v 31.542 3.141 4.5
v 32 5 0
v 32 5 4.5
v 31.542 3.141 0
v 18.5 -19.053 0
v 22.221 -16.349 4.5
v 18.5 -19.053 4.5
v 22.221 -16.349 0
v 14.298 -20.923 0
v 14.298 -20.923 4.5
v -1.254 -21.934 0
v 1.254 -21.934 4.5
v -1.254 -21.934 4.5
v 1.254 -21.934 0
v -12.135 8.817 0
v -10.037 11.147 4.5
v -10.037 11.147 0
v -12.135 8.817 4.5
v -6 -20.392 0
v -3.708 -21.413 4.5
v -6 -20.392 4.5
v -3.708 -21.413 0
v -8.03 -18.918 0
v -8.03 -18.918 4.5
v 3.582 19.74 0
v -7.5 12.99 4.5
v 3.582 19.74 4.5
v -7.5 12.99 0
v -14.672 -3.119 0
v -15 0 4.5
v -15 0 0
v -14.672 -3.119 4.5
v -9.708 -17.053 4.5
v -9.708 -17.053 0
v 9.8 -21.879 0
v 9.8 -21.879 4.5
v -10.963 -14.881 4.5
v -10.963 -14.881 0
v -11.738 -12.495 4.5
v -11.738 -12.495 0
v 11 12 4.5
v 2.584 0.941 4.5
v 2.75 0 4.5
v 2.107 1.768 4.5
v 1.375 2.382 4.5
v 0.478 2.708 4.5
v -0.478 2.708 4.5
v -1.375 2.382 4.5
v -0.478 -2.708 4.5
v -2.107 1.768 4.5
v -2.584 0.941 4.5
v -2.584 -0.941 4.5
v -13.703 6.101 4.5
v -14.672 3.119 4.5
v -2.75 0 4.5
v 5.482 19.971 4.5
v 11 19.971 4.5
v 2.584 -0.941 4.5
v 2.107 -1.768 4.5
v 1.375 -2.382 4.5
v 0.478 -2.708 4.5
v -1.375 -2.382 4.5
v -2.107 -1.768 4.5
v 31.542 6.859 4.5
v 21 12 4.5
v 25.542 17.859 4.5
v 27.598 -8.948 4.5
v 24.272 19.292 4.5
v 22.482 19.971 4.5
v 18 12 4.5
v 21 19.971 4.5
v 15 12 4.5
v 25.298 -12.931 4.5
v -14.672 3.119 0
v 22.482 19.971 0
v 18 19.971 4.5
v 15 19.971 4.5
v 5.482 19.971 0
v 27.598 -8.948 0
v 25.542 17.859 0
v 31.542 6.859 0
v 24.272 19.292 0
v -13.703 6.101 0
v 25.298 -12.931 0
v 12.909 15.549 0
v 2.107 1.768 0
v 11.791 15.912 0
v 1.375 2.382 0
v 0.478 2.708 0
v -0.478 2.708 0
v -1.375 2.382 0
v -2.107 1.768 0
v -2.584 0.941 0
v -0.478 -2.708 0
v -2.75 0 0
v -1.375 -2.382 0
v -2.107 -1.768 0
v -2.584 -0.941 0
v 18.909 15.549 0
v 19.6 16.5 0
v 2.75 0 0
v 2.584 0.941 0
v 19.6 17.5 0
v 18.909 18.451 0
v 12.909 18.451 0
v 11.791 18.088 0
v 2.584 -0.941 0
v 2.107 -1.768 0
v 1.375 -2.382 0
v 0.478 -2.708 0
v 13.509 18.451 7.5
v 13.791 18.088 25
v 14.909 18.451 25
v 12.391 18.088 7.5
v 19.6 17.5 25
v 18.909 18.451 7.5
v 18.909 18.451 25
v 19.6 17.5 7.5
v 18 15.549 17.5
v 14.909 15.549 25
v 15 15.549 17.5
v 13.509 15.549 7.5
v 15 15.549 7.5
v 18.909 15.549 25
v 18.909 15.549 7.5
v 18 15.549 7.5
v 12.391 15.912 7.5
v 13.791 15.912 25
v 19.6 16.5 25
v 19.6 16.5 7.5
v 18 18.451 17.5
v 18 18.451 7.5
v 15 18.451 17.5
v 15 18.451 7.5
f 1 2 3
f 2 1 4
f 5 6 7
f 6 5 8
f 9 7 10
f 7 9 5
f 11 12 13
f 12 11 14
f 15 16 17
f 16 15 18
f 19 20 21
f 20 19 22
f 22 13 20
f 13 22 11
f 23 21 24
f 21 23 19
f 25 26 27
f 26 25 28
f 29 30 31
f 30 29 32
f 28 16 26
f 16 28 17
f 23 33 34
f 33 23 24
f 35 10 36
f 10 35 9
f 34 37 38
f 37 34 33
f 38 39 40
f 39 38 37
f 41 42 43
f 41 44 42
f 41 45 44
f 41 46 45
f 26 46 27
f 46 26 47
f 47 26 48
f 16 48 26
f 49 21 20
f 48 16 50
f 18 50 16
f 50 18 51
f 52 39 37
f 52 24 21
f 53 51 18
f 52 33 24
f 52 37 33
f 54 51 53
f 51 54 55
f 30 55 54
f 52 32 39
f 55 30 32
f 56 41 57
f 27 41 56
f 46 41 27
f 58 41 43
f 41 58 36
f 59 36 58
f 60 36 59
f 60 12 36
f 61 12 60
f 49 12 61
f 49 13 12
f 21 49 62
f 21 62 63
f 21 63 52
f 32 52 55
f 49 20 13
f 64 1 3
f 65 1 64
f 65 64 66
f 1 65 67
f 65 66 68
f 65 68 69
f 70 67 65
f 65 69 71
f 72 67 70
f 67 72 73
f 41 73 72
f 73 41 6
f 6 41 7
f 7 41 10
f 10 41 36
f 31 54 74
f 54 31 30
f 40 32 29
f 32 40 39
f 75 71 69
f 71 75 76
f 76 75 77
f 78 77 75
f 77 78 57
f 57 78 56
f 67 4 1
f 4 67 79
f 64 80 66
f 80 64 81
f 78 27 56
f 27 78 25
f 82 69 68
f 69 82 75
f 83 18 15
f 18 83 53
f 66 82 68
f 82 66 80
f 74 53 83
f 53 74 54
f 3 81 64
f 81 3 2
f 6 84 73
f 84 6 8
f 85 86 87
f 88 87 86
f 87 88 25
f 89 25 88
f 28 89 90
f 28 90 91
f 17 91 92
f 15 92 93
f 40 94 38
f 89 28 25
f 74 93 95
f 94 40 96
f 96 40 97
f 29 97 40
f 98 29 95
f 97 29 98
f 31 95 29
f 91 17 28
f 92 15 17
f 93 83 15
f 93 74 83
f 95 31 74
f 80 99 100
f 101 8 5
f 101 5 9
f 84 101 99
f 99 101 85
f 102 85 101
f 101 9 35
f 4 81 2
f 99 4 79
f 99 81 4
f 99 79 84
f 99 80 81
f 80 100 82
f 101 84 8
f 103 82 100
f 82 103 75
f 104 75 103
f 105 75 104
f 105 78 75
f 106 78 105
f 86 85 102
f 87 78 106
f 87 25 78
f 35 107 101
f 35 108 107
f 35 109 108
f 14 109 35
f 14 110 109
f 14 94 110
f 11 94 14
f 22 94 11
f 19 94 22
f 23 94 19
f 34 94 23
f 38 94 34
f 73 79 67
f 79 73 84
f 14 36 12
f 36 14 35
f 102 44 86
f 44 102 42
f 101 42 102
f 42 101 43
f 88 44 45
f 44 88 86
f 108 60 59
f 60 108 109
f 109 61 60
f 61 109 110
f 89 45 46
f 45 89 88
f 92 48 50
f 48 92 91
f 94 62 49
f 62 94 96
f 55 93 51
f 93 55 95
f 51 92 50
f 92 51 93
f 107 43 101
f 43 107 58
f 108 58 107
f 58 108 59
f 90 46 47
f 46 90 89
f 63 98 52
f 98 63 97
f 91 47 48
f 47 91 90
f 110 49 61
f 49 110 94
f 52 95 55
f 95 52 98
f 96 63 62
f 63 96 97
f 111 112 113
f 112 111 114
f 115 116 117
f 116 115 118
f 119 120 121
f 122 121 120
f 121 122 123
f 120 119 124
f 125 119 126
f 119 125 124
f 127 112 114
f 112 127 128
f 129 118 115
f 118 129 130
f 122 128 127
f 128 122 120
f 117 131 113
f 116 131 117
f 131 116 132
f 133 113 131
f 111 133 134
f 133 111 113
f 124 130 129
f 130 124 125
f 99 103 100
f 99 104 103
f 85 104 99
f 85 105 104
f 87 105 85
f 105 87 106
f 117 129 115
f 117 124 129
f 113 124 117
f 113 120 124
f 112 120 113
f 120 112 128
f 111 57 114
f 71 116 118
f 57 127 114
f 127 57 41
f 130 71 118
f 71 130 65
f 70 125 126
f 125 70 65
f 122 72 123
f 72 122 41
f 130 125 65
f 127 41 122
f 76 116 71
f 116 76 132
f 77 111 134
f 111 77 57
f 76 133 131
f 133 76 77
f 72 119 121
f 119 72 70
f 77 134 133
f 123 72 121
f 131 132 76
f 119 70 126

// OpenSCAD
//---------------------------------------------------------------------------------------------------
// This work by Jordan Andersen licensed under the Creative Commons Attribution 3.0 Unported License.
// To view a copy of this license, visit http://creativecommons.org/licenses/by/3.0/
//---------------------------------------------------------------------------------------------------
//
// Replacement Lower Guide Plate for the Truvativ X-Guide Chain Guide
//
//---------------------------------------------------------------------------------------------------
SHIELD_HEIGHT = 4.5;
HOLE_RADIUS = 2.75;
POST_HEIGHT = 25;

POST_WIDTH_TOP = 4;
POST_WIDTH_BOTTOM = 6;
POST_POSITION = [12.6, 17.5, 0];
POST_ROUNDING_RADIUS = 1;


//---------------------------------------------------------------------------------

//The shield portion of the part. Form is not super strongly connected to function.
module shield()
{
    hull()
    {
         cylinder(r=15, h=SHIELD_HEIGHT, center=false);
    
        translate([7.5, 0, 0]) difference()
        {
            
            cylinder(r=22, h=SHIELD_HEIGHT, center=false);  
            union()
            {     
                translate([0, 0, -2]) cube([100,25,9]);
                translate([-25, -50, -2]) cube([25,100,9]);
            }
        }

        translate([0, -10, 0])  cylinder(r=12, h=SHIELD_HEIGHT, center=false);

        translate([28, 5, 0])  cylinder(r=4, h=SHIELD_HEIGHT, center=false);
        translate([22, 16, 0])  cylinder(r=4, h=SHIELD_HEIGHT, center=false);
        translate([5, 16, 0])  cylinder(r=4, h=SHIELD_HEIGHT, center=false);
    }

}

module hole()
{   
    cylinder(r=HOLE_RADIUS, $fs=1, h=50, center=true);   
}

//*** RED ***
//The post portion of the part. The top is a little thinner than the base to give it 
//a nice slope to allow it to fit in another part.
module post()
{
    rotate( a = 90, v=[1,0,0]) minkowski()
    {
        rotate( a = 90, v=[1,0,0]) cylinder(r=POST_ROUNDING_RADIUS, h=0.0001);
        linear_extrude(height = 1)
        {
            polygon(points=[
                            [0,0],
                            [POST_WIDTH_BOTTOM,0],
                            [POST_WIDTH_BOTTOM,POST_HEIGHT],
                            [POST_WIDTH_BOTTOM - POST_WIDTH_TOP,POST_HEIGHT]
                          ], 
                   paths=[[0,1,2,3]]);
        }
    }
}

//Part minus the fillet
module part()
{
    difference()
    {
         color("yellow", 0.8) shield();
         hole();
    }
    color("red") translate(POST_POSITION) post();
}

//*** BLUE ***
//Fillet on the post. Takes a region around the base of the post and fills
//in the concave portion. 
module fillet()
{
    hull()
    {
        intersection()
        {
            part();
            translate([11, 12, 2.5]) cube([10, 10, 5]);    
        }
    }
    hull()
    {
        intersection()
        {
            part();
            translate([15, 12, 2.5]) cube([3, 10, 15]);    
        }
    }


}

//Final part. Fillet added back in.
module filleted_part()
{
    part();
    color("blue") fillet();
}

//Some spacers to aid visualization
module debugging()
{
    translate([HOLE_RADIUS+ 15, -50, SHIELD_HEIGHT]) cube([5, 100, 6]);
    translate( [-50, HOLE_RADIUS, SHIELD_HEIGHT]) cube([100, 11, 6]);
}

filleted_part();
//color("skyblue") debugging();
